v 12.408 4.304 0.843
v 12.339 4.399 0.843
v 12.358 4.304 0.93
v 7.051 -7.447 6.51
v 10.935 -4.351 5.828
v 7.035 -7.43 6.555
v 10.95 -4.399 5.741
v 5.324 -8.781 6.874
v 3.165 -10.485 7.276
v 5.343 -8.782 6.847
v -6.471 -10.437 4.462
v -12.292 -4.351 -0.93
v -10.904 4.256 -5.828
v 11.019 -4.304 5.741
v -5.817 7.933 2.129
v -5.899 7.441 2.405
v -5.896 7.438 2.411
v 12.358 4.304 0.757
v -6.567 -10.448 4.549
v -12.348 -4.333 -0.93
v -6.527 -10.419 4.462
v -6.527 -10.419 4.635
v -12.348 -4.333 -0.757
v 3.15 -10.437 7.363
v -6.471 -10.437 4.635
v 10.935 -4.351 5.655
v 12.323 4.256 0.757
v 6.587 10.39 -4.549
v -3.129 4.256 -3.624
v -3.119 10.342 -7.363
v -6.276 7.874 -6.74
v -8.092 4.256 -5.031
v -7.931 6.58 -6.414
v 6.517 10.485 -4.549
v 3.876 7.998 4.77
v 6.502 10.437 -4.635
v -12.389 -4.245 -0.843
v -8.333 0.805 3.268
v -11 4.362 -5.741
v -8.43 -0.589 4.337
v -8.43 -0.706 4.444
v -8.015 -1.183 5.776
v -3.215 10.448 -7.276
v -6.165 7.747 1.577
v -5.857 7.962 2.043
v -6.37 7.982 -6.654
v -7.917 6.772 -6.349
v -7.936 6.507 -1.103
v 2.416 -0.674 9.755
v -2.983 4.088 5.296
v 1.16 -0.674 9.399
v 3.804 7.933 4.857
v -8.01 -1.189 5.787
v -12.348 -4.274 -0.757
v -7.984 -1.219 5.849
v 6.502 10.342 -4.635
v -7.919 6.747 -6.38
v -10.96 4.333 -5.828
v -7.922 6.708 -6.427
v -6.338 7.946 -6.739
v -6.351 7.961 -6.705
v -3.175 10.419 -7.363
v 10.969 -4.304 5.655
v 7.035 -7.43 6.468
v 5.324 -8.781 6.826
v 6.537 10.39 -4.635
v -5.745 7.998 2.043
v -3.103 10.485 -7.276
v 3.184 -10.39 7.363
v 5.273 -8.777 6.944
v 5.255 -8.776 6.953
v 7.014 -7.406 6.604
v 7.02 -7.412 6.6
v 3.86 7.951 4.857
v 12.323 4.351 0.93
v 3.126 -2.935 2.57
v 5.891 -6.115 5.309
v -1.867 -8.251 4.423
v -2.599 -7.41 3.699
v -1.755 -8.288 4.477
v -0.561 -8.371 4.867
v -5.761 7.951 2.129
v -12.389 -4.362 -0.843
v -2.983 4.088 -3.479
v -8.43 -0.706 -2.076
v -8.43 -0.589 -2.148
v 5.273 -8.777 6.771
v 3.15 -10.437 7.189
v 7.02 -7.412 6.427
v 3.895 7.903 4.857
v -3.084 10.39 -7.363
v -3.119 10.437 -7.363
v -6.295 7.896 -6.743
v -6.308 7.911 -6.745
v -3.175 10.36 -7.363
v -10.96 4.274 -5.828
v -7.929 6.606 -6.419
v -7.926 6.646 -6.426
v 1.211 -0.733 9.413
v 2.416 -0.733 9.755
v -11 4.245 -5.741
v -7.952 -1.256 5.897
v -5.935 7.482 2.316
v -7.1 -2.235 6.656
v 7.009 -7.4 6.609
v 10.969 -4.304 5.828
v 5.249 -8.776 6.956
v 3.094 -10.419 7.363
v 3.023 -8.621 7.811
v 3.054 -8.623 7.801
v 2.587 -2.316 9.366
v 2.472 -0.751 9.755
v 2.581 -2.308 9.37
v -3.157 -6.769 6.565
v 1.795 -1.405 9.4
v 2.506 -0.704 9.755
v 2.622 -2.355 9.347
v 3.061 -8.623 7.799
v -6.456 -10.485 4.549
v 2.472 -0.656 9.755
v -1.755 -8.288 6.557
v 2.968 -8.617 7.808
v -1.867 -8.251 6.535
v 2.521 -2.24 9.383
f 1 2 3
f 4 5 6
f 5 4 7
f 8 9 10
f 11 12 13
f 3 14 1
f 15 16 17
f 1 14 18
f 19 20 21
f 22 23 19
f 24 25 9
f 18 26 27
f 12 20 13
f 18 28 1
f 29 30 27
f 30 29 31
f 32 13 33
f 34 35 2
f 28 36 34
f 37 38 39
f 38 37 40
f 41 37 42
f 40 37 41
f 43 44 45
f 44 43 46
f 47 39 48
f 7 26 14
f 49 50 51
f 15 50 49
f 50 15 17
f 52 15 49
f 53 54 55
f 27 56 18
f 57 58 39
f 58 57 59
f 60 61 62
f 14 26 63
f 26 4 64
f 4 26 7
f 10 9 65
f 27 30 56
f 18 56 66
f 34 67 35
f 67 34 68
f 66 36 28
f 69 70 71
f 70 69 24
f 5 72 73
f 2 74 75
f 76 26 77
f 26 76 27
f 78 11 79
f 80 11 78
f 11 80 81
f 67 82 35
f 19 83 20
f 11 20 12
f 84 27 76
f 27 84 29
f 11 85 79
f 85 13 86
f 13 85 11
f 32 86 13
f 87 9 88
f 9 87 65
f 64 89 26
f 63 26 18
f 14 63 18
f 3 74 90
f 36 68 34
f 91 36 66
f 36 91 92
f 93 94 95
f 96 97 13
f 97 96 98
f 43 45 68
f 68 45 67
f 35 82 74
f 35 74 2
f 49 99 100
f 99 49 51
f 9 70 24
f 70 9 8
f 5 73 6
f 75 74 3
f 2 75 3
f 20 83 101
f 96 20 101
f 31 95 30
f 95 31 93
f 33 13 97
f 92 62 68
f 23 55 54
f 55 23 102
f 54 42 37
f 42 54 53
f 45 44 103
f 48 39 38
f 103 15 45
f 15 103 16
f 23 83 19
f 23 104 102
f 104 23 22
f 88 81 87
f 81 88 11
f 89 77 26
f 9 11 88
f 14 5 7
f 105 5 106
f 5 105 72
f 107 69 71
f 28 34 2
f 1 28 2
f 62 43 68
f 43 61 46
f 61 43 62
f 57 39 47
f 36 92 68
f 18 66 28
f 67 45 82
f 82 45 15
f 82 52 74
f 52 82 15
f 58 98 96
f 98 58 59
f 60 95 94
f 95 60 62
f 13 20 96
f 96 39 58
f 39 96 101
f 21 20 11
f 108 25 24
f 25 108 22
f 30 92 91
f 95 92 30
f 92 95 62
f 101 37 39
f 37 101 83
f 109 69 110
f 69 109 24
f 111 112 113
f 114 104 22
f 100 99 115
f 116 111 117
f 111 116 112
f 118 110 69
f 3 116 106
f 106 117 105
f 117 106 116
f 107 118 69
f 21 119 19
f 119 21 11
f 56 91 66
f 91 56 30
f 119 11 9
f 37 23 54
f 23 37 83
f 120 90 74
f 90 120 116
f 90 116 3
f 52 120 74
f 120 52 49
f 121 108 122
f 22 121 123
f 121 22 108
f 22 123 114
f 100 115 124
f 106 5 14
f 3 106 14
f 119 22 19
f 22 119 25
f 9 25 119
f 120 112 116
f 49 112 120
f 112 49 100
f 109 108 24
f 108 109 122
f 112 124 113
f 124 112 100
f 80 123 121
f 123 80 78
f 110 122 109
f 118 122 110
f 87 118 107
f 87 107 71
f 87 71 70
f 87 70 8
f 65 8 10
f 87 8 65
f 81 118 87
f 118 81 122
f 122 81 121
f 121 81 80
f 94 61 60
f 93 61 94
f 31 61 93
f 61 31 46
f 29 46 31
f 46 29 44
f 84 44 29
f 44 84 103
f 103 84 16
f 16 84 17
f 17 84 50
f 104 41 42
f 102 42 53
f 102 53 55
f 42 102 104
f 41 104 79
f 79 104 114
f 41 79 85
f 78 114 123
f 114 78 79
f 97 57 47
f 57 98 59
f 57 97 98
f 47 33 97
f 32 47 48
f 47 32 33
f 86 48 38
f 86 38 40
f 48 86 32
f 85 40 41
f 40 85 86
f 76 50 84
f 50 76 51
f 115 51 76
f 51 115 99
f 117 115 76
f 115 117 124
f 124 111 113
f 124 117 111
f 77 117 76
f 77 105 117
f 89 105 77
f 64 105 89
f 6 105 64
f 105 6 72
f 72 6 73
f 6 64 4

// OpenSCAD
// Auto-generated OpenSCAD file

    inner_points = 10*[[0.3549004973467511, -0.35521054808402747, -1.2071067811864837], [-0.30136407955047917, 0.39932030291538634, -1.2071067811866112], [0.3549004973463955, -0.3552105480839295, 1.2071067811866112], [-0.3013640795508348, 0.3993203029154843, 1.2071067811864837], [0.818949629923199, -0.8887444294401406, -0.4999999999998463], [-0.7654132121271353, 0.9328541842715569, -0.5000000000001537], [0.8189496299230516, -0.8887444294401, 0.5000000000001537], [-0.7654132121272826, 0.9328541842715975, 0.4999999999998463], [-0.178633384009495, -0.8192596806605508, -0.4999999999999961], [-0.8348979609067254, -0.06472882966113712, -0.5000000000001235], [-0.17863338400964232, -0.8192596806605101, 0.5000000000000039], [-0.8348979609068726, -0.06472882966109651, 0.49999999999987654]];

    outer_points = 10*[[1.2307668032340542, 0.4303553059775063, 0.08434552661867156], [1.0919099787017486, -0.4303553059775063, 0.574137344382946], [-1.0919099787017486, 0.4303553059775063, -0.574137344382946], [-1.2307668032340542, -0.4303553059775063, -0.08434552661867156], [0.6486571265504295, 1.0389696163301188, -0.4548547567133196], [0.3134270975364759, -1.0389696163301188, 0.7276072924725627], [-0.3134270975364759, 1.0389696163301188, -0.7276072924725627], [-0.6486571265504295, -1.0389696163301188, 0.4548547567133196], [0.3844694278615675, 0.7903395017889528, 0.47701858554126475], [0.24561260332926171, -0.07037111016605979, 0.9668104033055391], [-0.577614796225338, 0.7903395017889528, 0.20426604978202156], [-0.7164716207576437, -0.07037111016605979, 0.6940578675462961]];

    // Convex hull for inner set (I)
    module inner_hull() {
        hull() {
            for (p = inner_points) {
                translate(p) sphere(r=0.1);
            }
        }
    }

    // Convex hull for outer set (O) minus inner hull (O \ I)
    module outer_minus_inner() {
        difference() {
            hull() {
                for (p = outer_points) {
                    translate(p) sphere(r=0.1);
                }
            }
            inner_hull(); // Subtract inner hull
        }
    }

    // Convex hull for outer set (O) minus all translated inner hulls
    module outer_minus_AllTranslationInner() {
        difference() {
            hull() {
                for (p = outer_points) {
                    translate(p) sphere(r=0.1);
                }
            }
            hull() {
                translate([0,0,50]) inner_hull();
                translate([0,0,-50]) inner_hull();
            }; // Subtract translated inner hulls
        }
    }

    // Difference between outer_minus_inner and outer_minus_AllTranslationInner
    module outer_minus_inner_diff() {
        difference() {
            // Outer minus inner
            difference() {
                hull() {
                    for (p = outer_points) {
                        translate(p) sphere(r=0.1);
                    }
                }
                inner_hull();
            }

            // Subtract Outer minus AllTranslationInner
            difference() {
                hull() {
                    for (p = outer_points) {
                        translate(p) sphere(r=0.1);
                    }
                }
                hull() {
                    translate([0,0,50]) inner_hull();
                    translate([0,0,-50]) inner_hull();
                };
            }
        }
    }

    // Rendering all with colors applied
    color([0, 1, 0, 1]) outer_minus_AllTranslationInner(); // Opaque green
    
